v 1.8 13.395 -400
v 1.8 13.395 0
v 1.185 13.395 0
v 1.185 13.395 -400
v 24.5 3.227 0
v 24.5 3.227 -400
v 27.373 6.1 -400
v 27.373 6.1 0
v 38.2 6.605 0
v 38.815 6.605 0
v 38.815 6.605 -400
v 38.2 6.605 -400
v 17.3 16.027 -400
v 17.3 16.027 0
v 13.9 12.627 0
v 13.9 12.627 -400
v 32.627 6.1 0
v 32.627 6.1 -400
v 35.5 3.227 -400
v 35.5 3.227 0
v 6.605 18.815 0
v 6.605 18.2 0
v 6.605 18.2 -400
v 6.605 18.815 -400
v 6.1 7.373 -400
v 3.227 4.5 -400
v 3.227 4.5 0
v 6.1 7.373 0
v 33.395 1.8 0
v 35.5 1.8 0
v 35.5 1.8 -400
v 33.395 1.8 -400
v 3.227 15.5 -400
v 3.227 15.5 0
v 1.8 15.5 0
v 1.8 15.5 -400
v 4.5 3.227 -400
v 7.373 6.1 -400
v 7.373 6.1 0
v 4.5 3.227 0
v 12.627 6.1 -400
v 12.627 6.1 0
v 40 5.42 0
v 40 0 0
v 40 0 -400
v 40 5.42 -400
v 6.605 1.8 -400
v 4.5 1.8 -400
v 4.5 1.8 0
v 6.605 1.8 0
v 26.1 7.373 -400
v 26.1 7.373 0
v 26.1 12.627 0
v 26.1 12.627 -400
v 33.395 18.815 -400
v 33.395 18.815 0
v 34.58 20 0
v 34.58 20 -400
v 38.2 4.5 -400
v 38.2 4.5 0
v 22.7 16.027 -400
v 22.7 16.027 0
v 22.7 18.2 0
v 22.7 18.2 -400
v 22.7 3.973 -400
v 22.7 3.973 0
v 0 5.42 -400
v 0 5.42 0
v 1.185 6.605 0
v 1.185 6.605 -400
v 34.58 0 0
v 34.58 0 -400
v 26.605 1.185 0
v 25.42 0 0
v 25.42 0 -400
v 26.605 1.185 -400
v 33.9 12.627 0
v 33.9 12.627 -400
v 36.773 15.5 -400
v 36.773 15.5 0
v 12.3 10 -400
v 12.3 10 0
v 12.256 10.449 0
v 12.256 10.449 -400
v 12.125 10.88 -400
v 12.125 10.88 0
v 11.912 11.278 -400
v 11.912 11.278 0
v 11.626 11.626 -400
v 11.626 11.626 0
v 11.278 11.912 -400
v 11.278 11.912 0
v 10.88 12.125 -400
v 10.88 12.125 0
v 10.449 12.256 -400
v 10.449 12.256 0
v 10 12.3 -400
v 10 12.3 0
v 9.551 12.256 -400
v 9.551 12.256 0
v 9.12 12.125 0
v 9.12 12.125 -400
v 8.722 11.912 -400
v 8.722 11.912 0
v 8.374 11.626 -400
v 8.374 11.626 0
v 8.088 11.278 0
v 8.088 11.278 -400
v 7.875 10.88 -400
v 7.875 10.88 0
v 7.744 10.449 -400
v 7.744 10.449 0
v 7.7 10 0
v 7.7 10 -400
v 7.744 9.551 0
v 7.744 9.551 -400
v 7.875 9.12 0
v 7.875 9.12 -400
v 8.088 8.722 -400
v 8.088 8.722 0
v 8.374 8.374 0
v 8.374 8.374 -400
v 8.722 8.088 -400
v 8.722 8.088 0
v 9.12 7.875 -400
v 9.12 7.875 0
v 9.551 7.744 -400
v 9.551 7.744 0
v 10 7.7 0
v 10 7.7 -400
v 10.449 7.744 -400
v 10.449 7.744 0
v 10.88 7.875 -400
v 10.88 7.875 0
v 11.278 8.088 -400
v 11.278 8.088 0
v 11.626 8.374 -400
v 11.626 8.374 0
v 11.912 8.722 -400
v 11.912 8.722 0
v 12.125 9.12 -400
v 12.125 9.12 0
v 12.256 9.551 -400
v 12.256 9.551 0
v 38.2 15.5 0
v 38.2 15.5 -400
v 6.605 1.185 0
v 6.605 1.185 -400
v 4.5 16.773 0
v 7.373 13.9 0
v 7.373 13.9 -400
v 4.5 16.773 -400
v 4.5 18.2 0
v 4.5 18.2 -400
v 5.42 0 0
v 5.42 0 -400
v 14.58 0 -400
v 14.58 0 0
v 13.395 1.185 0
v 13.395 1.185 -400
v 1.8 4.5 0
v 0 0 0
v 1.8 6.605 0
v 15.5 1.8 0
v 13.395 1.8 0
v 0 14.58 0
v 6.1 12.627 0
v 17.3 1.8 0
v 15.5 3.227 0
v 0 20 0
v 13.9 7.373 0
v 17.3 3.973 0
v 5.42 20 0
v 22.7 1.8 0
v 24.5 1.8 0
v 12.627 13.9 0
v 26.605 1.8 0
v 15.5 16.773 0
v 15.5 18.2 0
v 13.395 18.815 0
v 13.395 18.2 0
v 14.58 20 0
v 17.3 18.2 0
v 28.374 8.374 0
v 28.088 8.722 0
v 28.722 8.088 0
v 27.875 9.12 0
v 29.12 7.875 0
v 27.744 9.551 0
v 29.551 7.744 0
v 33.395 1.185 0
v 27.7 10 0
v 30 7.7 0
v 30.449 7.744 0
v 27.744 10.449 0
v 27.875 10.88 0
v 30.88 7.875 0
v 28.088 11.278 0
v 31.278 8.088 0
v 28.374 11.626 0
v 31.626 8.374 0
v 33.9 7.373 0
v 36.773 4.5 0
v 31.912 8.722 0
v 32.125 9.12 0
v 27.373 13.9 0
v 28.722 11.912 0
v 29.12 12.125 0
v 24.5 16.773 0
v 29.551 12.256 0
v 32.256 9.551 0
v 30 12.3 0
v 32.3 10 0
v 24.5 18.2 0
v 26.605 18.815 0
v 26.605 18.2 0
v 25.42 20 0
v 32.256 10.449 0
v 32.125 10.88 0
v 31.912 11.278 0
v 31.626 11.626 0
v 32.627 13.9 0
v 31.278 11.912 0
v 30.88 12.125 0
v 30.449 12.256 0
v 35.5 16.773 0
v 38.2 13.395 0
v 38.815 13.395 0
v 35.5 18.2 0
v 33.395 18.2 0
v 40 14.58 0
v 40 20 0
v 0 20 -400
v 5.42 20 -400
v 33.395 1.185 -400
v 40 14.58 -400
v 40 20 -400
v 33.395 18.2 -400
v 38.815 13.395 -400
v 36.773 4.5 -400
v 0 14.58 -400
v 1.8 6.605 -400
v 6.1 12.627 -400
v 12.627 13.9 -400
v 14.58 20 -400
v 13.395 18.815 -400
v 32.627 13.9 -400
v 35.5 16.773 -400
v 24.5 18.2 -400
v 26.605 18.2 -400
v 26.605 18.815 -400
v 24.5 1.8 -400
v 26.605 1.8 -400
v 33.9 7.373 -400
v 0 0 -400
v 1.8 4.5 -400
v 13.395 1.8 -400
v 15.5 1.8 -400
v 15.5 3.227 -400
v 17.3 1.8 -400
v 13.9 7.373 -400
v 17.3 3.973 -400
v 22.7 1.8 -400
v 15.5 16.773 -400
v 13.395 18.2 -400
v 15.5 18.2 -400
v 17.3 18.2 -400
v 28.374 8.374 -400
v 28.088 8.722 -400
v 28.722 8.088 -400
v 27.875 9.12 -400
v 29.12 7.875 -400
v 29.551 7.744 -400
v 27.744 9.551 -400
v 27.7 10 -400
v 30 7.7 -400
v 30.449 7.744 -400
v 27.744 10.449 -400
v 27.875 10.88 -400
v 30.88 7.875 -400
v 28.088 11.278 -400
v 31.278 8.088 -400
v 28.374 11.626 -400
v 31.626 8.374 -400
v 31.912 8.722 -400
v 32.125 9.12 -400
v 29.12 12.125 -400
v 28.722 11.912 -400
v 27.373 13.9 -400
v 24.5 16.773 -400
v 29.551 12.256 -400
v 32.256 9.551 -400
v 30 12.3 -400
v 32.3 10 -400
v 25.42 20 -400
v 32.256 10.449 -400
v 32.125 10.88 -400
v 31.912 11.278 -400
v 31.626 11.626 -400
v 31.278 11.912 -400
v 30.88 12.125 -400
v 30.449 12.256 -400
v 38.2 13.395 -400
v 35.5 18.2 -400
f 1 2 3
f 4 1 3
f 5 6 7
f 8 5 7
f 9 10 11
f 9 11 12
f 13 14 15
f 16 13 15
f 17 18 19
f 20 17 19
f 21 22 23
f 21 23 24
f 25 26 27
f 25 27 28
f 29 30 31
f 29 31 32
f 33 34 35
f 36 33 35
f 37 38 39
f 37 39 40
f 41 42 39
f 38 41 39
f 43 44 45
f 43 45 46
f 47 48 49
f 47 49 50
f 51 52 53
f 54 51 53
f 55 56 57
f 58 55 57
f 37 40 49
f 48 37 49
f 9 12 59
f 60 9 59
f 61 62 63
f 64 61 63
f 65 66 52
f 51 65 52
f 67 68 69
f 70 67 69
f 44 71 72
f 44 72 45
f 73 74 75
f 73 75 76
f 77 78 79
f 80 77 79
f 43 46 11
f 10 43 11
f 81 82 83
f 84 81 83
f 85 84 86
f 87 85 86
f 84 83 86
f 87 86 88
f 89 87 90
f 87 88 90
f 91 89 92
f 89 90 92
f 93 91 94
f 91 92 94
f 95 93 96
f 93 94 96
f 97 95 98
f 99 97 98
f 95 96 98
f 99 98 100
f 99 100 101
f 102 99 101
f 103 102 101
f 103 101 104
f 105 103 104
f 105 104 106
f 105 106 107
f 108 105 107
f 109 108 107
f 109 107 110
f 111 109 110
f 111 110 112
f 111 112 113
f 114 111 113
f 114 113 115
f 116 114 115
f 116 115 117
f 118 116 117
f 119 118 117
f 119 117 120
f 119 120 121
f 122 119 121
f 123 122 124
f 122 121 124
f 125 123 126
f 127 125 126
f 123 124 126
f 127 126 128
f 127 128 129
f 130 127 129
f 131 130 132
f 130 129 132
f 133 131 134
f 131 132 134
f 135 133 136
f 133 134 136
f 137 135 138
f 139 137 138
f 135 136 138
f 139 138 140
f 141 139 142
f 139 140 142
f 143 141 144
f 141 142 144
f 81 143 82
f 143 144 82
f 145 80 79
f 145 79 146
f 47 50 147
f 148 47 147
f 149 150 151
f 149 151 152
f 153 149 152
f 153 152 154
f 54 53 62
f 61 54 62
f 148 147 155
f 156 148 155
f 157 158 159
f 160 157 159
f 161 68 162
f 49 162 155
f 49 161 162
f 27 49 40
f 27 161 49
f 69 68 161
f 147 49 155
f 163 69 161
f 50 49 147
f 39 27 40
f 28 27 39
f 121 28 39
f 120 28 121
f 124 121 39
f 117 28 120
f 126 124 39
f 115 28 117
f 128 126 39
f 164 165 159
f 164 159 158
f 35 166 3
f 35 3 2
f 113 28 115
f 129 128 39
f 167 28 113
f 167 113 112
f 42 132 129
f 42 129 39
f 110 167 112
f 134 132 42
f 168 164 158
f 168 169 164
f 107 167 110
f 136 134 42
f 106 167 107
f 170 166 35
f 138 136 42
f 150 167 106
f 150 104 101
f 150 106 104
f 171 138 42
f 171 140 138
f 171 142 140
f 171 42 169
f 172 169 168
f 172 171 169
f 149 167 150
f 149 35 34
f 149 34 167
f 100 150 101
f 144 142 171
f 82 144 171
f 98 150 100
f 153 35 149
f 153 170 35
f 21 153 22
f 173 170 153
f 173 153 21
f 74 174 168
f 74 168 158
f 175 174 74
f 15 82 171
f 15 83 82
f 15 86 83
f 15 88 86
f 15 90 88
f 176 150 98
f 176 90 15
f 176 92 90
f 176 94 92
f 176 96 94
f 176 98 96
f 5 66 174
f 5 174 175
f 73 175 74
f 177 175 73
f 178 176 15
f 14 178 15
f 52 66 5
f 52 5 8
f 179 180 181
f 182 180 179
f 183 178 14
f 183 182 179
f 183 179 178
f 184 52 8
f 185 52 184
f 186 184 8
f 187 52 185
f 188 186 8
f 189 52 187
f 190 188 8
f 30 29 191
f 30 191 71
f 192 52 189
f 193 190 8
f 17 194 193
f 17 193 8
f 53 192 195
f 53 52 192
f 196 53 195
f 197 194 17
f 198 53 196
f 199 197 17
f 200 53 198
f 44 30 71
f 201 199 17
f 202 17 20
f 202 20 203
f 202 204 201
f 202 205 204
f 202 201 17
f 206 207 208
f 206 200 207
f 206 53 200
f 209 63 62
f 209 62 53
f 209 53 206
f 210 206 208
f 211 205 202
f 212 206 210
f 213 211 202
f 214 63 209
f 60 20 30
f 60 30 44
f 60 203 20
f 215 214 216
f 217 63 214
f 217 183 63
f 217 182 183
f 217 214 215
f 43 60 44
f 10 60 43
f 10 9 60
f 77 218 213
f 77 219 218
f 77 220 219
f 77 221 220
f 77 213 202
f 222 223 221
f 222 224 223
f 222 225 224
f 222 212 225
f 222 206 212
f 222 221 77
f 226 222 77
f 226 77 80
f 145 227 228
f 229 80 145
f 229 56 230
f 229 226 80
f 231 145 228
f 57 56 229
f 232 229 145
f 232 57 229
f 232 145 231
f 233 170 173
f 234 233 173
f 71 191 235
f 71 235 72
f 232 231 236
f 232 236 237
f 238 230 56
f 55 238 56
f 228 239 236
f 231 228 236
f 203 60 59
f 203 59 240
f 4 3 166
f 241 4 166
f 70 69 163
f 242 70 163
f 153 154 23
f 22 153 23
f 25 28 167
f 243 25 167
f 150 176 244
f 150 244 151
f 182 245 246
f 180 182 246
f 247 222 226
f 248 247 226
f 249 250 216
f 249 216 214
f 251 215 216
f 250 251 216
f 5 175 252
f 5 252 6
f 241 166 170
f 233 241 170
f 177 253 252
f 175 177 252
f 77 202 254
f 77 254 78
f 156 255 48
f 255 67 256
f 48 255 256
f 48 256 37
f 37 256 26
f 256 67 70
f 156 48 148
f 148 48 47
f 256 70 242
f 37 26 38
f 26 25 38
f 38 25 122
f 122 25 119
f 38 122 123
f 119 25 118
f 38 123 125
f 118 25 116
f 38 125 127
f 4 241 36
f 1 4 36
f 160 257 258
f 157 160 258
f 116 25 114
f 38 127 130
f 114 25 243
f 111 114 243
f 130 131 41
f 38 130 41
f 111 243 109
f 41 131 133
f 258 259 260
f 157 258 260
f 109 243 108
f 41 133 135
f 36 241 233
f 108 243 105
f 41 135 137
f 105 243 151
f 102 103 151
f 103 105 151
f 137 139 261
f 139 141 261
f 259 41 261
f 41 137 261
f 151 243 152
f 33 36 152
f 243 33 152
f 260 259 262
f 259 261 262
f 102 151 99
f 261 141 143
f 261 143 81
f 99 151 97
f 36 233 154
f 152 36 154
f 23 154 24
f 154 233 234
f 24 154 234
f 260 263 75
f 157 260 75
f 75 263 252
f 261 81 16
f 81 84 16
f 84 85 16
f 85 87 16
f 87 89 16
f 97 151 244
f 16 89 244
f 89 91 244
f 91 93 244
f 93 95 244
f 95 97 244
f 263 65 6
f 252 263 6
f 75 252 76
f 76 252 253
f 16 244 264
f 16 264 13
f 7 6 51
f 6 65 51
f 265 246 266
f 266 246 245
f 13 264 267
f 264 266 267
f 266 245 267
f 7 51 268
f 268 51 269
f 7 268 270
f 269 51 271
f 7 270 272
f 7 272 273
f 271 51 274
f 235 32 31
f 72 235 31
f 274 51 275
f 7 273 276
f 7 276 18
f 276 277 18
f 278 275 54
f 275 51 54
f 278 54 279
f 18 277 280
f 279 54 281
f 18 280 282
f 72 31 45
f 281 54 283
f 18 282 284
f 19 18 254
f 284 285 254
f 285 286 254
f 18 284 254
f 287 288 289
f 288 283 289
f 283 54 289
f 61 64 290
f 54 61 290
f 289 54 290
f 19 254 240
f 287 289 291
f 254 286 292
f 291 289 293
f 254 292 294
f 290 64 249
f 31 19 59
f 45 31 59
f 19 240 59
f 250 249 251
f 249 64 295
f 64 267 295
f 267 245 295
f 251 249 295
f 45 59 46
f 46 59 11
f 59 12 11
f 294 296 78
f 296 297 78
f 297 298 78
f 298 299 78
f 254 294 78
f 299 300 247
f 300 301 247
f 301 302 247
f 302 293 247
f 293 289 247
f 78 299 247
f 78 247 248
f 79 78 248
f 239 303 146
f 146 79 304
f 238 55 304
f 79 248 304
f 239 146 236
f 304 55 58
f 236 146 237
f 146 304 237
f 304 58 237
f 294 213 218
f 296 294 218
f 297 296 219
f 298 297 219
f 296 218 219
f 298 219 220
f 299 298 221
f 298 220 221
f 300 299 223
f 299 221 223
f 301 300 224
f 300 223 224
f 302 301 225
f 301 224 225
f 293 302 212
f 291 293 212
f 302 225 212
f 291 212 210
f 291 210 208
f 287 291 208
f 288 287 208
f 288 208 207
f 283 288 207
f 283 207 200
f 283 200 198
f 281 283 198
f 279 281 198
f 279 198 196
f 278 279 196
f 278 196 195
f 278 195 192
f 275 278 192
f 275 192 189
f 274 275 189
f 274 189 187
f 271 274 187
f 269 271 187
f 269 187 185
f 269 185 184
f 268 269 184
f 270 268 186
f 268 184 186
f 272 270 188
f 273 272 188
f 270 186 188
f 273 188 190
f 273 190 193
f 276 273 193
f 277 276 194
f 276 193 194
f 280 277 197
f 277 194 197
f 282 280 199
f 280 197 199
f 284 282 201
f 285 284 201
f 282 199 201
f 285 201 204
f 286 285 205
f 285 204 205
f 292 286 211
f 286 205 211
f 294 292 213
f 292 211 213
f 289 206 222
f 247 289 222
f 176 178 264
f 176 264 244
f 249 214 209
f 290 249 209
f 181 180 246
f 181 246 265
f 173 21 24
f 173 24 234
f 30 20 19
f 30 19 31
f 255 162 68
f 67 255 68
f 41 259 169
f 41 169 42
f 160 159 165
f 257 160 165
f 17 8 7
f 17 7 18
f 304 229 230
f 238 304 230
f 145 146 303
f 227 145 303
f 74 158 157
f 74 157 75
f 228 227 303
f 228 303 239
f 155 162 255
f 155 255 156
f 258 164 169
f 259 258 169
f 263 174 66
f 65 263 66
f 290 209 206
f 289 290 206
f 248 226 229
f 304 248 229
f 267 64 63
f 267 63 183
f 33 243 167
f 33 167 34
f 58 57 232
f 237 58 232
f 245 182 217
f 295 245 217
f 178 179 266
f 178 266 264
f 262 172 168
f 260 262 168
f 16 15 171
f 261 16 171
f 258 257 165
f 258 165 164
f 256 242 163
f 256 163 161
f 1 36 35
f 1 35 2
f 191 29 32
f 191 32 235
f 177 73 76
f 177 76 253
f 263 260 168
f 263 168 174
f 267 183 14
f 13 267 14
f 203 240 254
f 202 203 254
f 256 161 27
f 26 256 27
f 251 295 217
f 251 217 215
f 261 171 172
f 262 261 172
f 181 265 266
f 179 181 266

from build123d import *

# Parameters (mm, degrees)
SKETCH1_W           = 40
SKETCH1_H           = 20
BOSS_EXTRUDE1_DEPTH = 400
CUT_EXTRUDE3_DEPTH  = 401
CUT_EXTRUDE4_DEPTH  = 401
SKETCH6_R           = 2.3
CUT_EXTRUDE5_DEPTH  = 401


with BuildPart() as part:
    # Sketch1 → Boss-Extrude1 (new body)
    with BuildSketch(Plane.XY):
        with Locations((20, 10)):
            Rectangle(SKETCH1_W, SKETCH1_H)
    extrude(amount=-BOSS_EXTRUDE1_DEPTH)

    # Sketch2 → Cut-Extrude3 (cut, through all)
    with BuildSketch(Plane.XY):
        Polygon((14.58, 20), (13.395, 18.815), (13.395, 18.2), (15.5, 18.2), (15.5, 16.772792206), (12.627207794, 13.9), (7.372792206, 13.9), (4.5, 16.772792206), (4.5, 18.2), (6.605, 18.2), (6.605, 18.815), (5.42, 20), align=None)
        Polygon((1.185, 13.395), (0, 14.58), (0, 5.42), (1.185, 6.605), (1.8, 6.605), (1.8, 4.5), (3.227207794, 4.5), (6.1, 7.372792206), (6.1, 12.627207794), (3.227207794, 15.5), (1.8, 15.5), (1.8, 13.395), align=None)
        Polygon((38.2, 13.395), (38.815, 13.395), (40, 14.58), (40, 5.42), (38.815, 6.605), (38.2, 6.605), (38.2, 4.5), (36.772792206, 4.5), (33.9, 7.372792206), (33.9, 12.627207794), (36.772792206, 15.5), (38.2, 15.5), align=None)
        Polygon((33.395, 18.815), (34.58, 20), (25.42, 20), (26.605, 18.815), (26.605, 18.2), (24.5, 18.2), (24.5, 16.772792206), (27.372792206, 13.9), (32.627207794, 13.9), (35.5, 16.772792206), (35.5, 18.2), (33.395, 18.2), align=None)
        Polygon((33.395, 1.8), (33.395, 1.185), (34.58, 0), (25.42, 0), (26.605, 1.185), (26.605, 1.8), (24.5, 1.8), (24.5, 3.227207794), (27.372792206, 6.1), (32.627207794, 6.1), (35.5, 3.227207794), (35.5, 1.8), align=None)
        Polygon((6.605, 1.185), (5.42, 0), (14.58, 0), (13.395, 1.185), (13.395, 1.8), (15.5, 1.8), (15.5, 3.227207794), (12.627207794, 6.1), (7.372792206, 6.1), (4.5, 3.227207794), (4.5, 1.8), (6.605, 1.8), align=None)
    extrude(amount=-CUT_EXTRUDE3_DEPTH, mode=Mode.SUBTRACT)

    # Sketch5 → Cut-Extrude4 (cut, through all)
    with BuildSketch(Plane.XY):
        Polygon((17.3, 1.8), (22.7, 1.8), (22.7, 3.972792206), (26.1, 7.372792206), (26.1, 12.627207794), (22.7, 16.027207794), (22.7, 18.2), (17.3, 18.2), (17.3, 16.027207794), (13.9, 12.627207794), (13.9, 7.372792206), (17.3, 3.972792206), align=None)
    extrude(amount=-CUT_EXTRUDE4_DEPTH, mode=Mode.SUBTRACT)

    # Sketch6 → Cut-Extrude5 (cut, through all)
    with BuildSketch(Plane.XY):
        with Locations((10, 10)):
            Circle(SKETCH6_R)
        with Locations((30, 10)):
            Circle(SKETCH6_R)
    extrude(amount=-CUT_EXTRUDE5_DEPTH, mode=Mode.SUBTRACT)


solid = part.part
